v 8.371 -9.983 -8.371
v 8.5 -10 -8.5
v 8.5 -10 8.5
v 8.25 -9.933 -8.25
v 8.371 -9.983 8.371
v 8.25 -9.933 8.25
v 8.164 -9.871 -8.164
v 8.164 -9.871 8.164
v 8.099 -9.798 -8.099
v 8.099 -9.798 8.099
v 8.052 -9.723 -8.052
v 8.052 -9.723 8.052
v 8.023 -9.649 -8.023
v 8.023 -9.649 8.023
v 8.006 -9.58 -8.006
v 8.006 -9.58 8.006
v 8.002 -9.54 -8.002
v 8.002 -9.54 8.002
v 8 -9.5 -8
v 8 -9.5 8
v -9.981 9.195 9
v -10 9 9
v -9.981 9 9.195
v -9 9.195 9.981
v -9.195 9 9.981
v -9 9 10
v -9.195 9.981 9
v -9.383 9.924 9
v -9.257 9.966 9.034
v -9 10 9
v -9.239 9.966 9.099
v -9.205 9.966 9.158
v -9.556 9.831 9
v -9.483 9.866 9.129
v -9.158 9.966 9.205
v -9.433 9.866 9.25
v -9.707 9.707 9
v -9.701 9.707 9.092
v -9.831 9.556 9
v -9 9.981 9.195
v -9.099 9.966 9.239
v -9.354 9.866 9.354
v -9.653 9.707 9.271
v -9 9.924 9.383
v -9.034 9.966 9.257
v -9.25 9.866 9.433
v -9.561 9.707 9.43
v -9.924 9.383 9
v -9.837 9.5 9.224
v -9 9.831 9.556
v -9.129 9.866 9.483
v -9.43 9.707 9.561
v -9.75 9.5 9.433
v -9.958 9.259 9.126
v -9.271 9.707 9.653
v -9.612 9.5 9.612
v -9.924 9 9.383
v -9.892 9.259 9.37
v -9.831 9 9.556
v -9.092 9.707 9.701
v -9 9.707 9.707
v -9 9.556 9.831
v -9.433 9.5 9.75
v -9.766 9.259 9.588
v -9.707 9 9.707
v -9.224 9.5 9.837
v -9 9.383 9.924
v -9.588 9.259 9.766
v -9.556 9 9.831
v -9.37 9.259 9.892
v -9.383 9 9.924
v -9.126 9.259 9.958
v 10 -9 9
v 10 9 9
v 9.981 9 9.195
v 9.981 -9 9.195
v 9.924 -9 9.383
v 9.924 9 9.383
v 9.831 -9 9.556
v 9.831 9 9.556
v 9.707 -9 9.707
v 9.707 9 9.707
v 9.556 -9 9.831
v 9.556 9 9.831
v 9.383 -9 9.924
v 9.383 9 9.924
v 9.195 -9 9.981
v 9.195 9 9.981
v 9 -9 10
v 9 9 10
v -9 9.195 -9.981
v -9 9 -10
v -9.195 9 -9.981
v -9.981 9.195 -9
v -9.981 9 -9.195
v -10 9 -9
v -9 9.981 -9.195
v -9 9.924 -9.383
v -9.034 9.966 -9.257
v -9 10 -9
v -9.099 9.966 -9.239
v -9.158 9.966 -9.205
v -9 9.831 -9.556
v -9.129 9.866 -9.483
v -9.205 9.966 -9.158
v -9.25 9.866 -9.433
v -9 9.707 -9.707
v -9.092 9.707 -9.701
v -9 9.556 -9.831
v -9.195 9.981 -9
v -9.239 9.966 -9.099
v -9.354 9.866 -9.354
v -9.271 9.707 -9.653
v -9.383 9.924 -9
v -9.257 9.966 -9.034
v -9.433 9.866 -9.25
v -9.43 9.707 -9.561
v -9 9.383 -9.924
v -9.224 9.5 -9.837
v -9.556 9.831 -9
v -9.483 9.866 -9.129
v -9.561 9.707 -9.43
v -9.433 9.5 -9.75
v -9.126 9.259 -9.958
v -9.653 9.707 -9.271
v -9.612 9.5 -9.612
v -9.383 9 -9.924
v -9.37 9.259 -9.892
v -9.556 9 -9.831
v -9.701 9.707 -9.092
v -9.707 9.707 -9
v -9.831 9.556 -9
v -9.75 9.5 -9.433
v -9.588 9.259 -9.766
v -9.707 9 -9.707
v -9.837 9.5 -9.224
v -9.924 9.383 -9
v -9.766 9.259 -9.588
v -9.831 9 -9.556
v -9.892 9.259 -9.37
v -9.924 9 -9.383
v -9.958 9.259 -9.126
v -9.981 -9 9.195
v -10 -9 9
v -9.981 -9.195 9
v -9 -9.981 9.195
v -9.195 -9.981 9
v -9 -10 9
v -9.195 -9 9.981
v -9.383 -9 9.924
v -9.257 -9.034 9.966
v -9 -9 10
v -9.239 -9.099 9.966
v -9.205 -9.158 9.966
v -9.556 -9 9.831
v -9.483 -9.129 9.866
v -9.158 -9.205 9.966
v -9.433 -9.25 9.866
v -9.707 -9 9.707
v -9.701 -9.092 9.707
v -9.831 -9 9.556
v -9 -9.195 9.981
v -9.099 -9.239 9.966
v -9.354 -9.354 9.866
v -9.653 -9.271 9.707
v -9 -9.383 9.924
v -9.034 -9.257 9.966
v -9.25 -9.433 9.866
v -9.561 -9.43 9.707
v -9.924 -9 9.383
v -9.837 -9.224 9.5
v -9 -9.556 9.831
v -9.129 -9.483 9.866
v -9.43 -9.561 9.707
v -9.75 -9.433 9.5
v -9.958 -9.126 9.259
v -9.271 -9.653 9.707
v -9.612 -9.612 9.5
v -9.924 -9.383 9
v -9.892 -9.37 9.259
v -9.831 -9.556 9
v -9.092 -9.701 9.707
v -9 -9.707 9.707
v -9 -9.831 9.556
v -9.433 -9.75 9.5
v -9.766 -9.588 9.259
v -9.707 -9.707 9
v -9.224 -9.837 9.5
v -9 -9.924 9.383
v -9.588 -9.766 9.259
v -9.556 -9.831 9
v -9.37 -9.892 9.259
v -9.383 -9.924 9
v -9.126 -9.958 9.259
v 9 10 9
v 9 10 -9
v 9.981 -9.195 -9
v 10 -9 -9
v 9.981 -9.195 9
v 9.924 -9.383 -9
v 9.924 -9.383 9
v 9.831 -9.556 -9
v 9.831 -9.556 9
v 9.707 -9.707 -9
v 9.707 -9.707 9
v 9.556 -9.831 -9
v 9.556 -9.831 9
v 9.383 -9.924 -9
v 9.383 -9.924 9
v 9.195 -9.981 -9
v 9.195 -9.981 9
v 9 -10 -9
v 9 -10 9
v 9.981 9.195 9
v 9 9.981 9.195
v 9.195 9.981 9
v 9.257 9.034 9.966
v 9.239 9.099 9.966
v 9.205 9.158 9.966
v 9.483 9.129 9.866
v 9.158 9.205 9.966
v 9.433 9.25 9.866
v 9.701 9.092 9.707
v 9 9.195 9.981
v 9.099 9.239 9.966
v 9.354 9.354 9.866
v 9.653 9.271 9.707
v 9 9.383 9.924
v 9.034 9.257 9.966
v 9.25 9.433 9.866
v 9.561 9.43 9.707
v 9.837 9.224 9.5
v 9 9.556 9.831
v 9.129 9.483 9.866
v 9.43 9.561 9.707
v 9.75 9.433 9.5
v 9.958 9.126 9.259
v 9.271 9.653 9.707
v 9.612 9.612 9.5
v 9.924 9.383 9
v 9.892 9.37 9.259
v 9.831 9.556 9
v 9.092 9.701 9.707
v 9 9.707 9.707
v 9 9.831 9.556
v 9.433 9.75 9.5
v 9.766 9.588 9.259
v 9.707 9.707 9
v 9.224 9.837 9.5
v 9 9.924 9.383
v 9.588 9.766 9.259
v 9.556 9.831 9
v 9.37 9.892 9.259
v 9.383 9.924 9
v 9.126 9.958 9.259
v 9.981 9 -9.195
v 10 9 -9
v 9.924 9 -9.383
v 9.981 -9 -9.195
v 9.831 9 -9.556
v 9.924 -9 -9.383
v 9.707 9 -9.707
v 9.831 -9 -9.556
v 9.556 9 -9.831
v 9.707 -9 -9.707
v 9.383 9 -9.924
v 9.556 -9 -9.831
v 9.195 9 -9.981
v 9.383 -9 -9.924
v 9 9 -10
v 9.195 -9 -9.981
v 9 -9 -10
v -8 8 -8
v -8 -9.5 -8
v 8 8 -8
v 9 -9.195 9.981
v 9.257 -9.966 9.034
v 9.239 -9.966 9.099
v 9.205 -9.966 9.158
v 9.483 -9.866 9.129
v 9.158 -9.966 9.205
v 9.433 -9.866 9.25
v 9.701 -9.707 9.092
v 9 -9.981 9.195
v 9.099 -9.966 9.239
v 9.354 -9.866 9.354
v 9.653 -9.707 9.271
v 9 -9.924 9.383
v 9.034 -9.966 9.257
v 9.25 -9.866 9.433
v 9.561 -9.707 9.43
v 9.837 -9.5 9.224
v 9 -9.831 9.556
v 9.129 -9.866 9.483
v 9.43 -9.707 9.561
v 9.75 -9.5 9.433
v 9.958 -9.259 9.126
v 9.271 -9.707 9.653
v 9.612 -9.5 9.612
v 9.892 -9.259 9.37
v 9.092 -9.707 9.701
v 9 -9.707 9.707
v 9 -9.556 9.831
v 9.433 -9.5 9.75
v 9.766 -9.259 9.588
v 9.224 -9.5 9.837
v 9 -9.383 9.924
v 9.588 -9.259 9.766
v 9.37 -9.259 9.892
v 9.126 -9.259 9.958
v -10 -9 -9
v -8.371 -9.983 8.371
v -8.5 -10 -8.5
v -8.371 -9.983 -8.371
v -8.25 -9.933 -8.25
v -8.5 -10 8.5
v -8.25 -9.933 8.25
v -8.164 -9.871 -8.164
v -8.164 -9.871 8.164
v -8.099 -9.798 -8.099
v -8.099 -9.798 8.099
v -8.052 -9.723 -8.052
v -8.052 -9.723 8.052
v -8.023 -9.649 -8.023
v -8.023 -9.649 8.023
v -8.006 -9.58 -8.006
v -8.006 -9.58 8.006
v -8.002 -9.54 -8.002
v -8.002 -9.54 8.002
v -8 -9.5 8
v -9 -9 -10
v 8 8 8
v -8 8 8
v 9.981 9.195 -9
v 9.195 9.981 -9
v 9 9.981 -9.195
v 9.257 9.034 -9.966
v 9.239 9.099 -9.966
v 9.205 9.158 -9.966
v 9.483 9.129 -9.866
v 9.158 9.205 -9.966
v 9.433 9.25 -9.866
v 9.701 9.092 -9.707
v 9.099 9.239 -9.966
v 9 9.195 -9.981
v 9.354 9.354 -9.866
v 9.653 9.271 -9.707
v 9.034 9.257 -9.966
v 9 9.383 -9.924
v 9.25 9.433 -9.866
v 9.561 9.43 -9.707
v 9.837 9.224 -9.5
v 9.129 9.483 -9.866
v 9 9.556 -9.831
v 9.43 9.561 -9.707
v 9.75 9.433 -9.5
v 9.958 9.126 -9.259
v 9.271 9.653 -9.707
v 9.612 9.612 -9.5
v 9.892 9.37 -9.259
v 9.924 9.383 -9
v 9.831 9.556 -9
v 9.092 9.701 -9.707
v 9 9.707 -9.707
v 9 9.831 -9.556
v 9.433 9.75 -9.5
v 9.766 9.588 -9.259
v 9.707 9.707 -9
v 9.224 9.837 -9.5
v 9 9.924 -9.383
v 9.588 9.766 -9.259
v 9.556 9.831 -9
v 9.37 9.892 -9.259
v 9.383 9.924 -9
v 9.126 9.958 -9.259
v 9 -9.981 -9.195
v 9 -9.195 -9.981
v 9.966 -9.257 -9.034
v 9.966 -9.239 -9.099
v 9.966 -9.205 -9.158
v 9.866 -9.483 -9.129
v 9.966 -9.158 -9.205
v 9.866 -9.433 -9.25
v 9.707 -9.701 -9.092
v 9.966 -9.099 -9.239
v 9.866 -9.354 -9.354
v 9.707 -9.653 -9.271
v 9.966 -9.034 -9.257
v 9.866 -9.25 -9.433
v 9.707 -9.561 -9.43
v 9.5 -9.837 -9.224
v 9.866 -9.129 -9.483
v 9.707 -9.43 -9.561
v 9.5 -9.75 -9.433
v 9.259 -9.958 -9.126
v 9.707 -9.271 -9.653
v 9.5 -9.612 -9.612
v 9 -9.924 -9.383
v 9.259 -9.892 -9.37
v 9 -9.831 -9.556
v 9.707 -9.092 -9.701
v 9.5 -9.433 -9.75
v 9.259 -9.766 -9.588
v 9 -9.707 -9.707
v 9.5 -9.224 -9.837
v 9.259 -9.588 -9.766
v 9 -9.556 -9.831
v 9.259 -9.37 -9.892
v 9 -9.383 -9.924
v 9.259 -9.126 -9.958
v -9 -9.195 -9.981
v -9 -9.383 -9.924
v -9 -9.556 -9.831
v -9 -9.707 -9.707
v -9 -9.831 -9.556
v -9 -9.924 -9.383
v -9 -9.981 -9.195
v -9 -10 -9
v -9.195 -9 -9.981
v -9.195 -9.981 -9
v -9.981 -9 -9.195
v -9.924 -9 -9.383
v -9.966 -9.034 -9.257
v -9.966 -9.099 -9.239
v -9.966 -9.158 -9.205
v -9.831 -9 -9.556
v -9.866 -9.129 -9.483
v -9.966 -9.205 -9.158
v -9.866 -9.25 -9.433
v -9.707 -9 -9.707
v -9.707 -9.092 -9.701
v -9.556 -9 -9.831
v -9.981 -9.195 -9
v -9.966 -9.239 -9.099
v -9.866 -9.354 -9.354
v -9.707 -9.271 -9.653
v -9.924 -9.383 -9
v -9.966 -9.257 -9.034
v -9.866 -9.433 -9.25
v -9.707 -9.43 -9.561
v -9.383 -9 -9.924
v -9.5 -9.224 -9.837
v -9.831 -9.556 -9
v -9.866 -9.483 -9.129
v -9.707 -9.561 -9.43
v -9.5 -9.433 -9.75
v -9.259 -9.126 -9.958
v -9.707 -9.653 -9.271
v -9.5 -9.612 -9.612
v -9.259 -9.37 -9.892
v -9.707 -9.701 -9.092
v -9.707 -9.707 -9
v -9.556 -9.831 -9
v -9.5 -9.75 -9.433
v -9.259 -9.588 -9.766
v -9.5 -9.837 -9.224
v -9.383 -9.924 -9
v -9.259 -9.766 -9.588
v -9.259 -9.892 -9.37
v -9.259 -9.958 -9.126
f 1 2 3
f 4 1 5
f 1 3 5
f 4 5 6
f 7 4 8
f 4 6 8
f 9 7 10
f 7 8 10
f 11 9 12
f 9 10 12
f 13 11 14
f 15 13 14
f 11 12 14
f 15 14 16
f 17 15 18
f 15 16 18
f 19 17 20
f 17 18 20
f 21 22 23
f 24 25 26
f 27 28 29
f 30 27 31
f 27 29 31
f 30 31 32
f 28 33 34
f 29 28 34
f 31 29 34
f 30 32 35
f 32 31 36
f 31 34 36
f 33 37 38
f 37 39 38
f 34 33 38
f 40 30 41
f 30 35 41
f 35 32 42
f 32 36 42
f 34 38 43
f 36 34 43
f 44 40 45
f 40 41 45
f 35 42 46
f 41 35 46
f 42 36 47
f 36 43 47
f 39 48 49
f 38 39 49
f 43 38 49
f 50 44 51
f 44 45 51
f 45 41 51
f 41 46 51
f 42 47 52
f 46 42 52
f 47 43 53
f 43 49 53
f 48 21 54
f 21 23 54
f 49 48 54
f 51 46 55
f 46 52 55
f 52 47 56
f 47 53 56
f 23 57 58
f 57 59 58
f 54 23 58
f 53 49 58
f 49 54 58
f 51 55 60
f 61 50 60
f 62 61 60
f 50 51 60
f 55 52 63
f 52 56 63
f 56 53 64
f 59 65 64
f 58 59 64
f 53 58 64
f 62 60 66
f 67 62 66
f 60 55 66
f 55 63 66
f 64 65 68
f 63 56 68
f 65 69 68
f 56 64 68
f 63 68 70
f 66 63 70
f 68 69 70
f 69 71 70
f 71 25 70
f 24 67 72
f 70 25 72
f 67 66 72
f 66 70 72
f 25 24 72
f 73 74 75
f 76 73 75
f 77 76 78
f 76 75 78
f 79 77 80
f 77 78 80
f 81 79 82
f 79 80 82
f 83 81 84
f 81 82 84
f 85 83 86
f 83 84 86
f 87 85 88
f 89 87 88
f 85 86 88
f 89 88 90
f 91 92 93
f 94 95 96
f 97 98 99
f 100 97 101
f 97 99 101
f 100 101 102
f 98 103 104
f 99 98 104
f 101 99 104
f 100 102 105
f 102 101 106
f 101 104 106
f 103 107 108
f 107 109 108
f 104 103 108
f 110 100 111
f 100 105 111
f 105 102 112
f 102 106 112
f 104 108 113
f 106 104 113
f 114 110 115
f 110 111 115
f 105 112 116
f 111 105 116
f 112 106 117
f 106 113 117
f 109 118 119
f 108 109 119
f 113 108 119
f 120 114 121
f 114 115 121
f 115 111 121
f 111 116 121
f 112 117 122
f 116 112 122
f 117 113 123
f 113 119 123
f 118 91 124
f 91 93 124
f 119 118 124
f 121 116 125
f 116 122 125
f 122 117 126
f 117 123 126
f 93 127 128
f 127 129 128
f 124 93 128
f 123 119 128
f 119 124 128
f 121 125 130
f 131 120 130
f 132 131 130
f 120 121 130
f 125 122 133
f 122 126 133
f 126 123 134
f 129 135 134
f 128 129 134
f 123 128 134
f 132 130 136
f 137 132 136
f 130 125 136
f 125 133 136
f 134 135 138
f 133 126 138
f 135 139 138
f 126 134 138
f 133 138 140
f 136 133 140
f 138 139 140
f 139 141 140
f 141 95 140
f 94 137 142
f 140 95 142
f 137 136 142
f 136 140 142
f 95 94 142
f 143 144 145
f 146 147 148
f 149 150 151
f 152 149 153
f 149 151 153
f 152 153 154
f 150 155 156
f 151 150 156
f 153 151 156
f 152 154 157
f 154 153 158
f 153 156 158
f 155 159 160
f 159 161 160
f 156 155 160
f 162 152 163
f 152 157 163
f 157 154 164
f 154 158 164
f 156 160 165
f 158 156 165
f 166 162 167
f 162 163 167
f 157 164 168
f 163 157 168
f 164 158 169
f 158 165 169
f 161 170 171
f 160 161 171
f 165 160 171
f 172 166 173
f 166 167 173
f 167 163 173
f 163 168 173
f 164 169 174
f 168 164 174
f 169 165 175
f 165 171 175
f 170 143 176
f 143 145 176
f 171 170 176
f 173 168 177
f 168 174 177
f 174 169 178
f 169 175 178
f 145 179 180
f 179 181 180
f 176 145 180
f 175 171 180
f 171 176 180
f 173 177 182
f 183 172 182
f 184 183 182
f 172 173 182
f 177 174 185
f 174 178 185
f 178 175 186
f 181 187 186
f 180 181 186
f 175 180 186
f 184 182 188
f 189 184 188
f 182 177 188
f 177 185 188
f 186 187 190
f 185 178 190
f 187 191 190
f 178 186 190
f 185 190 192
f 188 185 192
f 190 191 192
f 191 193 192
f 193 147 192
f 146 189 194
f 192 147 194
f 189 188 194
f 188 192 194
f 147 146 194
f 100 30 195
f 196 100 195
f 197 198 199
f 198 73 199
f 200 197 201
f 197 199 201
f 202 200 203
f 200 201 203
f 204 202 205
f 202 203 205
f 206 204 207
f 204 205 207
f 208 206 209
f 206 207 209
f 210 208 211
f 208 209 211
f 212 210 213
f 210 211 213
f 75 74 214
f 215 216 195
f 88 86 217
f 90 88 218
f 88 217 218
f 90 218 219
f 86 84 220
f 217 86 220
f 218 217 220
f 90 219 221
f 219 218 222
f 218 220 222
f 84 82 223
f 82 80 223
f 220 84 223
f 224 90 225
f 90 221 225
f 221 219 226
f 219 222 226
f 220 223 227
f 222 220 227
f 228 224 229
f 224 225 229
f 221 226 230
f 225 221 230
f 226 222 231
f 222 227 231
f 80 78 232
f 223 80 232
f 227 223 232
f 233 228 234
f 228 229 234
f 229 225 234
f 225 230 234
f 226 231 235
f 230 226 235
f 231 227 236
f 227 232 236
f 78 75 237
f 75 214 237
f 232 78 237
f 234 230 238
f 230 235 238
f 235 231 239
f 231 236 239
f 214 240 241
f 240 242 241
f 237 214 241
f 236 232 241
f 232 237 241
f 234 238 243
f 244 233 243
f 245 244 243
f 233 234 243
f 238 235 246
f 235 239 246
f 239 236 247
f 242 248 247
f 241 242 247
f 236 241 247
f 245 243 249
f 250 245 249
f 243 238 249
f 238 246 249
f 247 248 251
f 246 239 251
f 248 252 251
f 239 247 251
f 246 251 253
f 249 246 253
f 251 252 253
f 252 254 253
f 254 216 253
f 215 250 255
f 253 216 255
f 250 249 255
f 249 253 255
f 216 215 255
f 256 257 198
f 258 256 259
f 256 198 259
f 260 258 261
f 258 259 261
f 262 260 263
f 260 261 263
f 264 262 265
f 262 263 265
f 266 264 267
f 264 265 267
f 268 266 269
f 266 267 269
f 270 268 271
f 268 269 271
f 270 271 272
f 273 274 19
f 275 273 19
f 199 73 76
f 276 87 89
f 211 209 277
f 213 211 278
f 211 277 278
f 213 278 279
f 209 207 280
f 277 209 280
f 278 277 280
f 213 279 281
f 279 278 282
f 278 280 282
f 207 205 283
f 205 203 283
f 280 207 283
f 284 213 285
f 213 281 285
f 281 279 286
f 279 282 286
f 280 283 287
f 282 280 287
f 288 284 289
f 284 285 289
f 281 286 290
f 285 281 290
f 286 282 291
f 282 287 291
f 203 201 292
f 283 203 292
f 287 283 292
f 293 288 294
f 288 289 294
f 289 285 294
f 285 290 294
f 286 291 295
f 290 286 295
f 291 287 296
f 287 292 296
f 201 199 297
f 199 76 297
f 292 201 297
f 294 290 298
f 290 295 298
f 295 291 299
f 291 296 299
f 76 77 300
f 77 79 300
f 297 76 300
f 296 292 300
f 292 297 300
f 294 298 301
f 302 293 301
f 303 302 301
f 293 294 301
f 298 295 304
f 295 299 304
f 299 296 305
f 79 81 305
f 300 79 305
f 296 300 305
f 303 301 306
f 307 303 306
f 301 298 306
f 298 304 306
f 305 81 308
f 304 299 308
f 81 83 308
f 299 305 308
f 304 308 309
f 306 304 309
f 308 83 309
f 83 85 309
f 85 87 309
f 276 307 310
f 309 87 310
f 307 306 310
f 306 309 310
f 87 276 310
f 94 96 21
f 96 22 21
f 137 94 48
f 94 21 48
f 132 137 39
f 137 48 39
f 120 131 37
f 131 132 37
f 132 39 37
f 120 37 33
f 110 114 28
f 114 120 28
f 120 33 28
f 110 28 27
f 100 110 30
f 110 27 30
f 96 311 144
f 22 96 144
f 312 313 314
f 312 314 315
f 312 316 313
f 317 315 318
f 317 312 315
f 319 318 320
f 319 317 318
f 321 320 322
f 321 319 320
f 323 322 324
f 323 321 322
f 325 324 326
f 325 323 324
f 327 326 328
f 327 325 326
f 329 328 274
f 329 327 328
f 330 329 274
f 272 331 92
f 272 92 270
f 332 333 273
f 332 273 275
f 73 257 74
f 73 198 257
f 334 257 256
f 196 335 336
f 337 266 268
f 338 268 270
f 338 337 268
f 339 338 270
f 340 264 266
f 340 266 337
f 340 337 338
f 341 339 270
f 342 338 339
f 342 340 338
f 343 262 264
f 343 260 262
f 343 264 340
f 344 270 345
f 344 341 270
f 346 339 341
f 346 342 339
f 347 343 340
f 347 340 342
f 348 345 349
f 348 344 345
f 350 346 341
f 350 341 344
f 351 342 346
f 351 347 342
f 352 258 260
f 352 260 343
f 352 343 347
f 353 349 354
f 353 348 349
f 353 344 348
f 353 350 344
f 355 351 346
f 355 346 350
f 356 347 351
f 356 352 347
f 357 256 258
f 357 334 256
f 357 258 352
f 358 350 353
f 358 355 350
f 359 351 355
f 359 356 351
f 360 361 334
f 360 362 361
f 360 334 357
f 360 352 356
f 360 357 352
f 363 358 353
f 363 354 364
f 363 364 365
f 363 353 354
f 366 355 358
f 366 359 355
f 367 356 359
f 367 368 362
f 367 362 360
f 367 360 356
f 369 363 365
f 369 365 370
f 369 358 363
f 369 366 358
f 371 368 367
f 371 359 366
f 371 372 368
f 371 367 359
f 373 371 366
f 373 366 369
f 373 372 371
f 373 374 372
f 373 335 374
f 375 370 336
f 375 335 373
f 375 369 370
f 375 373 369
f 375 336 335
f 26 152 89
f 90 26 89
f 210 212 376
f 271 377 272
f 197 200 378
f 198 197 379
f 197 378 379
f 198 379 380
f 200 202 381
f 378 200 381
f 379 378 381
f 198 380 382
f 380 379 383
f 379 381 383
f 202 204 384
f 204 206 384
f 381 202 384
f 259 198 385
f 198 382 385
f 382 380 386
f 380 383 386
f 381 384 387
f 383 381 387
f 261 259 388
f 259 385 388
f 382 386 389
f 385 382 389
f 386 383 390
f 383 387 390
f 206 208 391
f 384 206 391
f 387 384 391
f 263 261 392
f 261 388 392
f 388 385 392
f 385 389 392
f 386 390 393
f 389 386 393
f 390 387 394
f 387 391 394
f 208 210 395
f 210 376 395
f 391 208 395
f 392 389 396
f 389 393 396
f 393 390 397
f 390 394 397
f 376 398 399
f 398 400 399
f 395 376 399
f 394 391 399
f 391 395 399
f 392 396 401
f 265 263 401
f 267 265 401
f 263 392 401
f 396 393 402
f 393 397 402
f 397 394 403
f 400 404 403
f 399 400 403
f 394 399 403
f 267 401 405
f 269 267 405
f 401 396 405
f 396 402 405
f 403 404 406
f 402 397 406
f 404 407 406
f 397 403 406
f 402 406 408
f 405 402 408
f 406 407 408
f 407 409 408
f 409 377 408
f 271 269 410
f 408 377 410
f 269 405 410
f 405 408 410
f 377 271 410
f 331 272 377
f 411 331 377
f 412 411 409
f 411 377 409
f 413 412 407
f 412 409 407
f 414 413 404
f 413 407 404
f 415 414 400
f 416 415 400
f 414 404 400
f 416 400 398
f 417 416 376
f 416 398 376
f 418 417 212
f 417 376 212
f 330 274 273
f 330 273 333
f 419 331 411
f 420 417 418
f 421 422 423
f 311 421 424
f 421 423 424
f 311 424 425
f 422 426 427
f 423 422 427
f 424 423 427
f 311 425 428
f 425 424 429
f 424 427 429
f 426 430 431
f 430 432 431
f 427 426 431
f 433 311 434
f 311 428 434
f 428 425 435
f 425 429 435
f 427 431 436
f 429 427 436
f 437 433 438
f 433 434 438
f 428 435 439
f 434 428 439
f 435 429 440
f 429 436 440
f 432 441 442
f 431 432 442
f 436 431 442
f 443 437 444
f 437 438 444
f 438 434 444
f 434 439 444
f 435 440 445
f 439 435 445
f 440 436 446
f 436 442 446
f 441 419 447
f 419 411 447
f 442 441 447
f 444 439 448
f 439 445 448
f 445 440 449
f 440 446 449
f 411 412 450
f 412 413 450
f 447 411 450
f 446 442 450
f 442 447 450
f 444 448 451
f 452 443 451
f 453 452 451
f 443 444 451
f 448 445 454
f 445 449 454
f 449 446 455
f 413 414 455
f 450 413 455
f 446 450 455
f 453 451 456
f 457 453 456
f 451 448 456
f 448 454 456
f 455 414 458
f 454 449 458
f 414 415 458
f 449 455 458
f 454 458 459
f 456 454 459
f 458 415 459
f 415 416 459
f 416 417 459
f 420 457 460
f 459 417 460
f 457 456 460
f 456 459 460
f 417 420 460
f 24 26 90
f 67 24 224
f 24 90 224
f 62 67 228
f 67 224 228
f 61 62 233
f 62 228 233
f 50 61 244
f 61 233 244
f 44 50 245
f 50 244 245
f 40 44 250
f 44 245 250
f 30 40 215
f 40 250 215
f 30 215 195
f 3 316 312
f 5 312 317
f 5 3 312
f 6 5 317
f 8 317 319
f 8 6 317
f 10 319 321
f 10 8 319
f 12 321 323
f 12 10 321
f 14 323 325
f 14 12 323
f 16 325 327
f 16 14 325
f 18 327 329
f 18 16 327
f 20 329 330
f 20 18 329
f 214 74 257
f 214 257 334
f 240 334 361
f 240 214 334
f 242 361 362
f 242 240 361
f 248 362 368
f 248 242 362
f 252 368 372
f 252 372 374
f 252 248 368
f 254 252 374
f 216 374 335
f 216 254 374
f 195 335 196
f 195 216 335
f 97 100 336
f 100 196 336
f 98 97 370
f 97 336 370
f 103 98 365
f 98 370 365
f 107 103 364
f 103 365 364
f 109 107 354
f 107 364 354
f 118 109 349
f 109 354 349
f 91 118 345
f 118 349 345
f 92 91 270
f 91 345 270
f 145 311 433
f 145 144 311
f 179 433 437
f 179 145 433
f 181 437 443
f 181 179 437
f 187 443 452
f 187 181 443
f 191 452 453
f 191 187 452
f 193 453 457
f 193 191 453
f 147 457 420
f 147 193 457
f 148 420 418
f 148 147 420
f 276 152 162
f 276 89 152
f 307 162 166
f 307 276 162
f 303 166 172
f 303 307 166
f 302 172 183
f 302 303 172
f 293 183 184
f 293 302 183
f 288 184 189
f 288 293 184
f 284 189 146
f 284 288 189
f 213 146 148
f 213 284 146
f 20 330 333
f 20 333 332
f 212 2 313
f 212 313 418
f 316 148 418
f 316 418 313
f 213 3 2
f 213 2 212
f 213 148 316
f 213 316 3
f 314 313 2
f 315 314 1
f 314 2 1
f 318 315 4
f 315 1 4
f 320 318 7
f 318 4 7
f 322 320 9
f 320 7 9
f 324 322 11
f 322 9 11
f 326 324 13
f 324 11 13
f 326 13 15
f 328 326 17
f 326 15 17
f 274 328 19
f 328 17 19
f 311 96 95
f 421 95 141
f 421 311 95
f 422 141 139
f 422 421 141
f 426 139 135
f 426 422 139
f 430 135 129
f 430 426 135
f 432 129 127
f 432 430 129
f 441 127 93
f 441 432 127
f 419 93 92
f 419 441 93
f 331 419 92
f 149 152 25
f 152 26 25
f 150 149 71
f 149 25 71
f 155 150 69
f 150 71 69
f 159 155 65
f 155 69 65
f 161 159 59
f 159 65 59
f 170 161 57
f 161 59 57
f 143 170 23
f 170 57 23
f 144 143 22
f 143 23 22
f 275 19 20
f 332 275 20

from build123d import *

# Parameters (mm, degrees)
F0_W     = 20
F0_H     = 20
F1_DEPTH = 10
F2_T     = -2
F3_R     = 1
F4_R     = 0.5


with BuildPart() as f1:
    # F0 (on Front) → F1 (new body, symmetric)
    with BuildSketch(Plane.XZ):
        Rectangle(F0_W, F0_H)
    extrude(amount=F1_DEPTH, both=True)

    # F2
    f2_openings = [f1.faces().sort_by_distance(p)[0] for p in [
        (0, -10, 0),
    ]]
    offset(amount=F2_T, openings=f2_openings)

    # F3
    f3_edges = [f1.edges().sort_by_distance(p)[0] for p in [
        (0, -10, -10),
        (10, 10, 0),
        (10, 0, 10),
        (10, -10, 0),
        (10, 0, -10),
        (-10, 0, -10),
        (0, 10, -10),
        (-10, -10, 0),
        (-10, 0, 10),
        (-10, 10, 0),
        (0, 10, 10),
        (0, -10, 10),
    ]]
    fillet(f3_edges, radius=F3_R)

    # F4
    f4_edges = [f1.edges().sort_by_distance(p)[0] for p in [
        (-8, -10, 0),
        (0, -10, -8),
        (8, -10, 0),
        (0, -10, -9),
        (-9, -10, 0),
        (9, -10, 0),
        (0, -10, 9),
        (0, -10, 8),
    ]]
    fillet(f4_edges, radius=F4_R)


solid = f1.part
